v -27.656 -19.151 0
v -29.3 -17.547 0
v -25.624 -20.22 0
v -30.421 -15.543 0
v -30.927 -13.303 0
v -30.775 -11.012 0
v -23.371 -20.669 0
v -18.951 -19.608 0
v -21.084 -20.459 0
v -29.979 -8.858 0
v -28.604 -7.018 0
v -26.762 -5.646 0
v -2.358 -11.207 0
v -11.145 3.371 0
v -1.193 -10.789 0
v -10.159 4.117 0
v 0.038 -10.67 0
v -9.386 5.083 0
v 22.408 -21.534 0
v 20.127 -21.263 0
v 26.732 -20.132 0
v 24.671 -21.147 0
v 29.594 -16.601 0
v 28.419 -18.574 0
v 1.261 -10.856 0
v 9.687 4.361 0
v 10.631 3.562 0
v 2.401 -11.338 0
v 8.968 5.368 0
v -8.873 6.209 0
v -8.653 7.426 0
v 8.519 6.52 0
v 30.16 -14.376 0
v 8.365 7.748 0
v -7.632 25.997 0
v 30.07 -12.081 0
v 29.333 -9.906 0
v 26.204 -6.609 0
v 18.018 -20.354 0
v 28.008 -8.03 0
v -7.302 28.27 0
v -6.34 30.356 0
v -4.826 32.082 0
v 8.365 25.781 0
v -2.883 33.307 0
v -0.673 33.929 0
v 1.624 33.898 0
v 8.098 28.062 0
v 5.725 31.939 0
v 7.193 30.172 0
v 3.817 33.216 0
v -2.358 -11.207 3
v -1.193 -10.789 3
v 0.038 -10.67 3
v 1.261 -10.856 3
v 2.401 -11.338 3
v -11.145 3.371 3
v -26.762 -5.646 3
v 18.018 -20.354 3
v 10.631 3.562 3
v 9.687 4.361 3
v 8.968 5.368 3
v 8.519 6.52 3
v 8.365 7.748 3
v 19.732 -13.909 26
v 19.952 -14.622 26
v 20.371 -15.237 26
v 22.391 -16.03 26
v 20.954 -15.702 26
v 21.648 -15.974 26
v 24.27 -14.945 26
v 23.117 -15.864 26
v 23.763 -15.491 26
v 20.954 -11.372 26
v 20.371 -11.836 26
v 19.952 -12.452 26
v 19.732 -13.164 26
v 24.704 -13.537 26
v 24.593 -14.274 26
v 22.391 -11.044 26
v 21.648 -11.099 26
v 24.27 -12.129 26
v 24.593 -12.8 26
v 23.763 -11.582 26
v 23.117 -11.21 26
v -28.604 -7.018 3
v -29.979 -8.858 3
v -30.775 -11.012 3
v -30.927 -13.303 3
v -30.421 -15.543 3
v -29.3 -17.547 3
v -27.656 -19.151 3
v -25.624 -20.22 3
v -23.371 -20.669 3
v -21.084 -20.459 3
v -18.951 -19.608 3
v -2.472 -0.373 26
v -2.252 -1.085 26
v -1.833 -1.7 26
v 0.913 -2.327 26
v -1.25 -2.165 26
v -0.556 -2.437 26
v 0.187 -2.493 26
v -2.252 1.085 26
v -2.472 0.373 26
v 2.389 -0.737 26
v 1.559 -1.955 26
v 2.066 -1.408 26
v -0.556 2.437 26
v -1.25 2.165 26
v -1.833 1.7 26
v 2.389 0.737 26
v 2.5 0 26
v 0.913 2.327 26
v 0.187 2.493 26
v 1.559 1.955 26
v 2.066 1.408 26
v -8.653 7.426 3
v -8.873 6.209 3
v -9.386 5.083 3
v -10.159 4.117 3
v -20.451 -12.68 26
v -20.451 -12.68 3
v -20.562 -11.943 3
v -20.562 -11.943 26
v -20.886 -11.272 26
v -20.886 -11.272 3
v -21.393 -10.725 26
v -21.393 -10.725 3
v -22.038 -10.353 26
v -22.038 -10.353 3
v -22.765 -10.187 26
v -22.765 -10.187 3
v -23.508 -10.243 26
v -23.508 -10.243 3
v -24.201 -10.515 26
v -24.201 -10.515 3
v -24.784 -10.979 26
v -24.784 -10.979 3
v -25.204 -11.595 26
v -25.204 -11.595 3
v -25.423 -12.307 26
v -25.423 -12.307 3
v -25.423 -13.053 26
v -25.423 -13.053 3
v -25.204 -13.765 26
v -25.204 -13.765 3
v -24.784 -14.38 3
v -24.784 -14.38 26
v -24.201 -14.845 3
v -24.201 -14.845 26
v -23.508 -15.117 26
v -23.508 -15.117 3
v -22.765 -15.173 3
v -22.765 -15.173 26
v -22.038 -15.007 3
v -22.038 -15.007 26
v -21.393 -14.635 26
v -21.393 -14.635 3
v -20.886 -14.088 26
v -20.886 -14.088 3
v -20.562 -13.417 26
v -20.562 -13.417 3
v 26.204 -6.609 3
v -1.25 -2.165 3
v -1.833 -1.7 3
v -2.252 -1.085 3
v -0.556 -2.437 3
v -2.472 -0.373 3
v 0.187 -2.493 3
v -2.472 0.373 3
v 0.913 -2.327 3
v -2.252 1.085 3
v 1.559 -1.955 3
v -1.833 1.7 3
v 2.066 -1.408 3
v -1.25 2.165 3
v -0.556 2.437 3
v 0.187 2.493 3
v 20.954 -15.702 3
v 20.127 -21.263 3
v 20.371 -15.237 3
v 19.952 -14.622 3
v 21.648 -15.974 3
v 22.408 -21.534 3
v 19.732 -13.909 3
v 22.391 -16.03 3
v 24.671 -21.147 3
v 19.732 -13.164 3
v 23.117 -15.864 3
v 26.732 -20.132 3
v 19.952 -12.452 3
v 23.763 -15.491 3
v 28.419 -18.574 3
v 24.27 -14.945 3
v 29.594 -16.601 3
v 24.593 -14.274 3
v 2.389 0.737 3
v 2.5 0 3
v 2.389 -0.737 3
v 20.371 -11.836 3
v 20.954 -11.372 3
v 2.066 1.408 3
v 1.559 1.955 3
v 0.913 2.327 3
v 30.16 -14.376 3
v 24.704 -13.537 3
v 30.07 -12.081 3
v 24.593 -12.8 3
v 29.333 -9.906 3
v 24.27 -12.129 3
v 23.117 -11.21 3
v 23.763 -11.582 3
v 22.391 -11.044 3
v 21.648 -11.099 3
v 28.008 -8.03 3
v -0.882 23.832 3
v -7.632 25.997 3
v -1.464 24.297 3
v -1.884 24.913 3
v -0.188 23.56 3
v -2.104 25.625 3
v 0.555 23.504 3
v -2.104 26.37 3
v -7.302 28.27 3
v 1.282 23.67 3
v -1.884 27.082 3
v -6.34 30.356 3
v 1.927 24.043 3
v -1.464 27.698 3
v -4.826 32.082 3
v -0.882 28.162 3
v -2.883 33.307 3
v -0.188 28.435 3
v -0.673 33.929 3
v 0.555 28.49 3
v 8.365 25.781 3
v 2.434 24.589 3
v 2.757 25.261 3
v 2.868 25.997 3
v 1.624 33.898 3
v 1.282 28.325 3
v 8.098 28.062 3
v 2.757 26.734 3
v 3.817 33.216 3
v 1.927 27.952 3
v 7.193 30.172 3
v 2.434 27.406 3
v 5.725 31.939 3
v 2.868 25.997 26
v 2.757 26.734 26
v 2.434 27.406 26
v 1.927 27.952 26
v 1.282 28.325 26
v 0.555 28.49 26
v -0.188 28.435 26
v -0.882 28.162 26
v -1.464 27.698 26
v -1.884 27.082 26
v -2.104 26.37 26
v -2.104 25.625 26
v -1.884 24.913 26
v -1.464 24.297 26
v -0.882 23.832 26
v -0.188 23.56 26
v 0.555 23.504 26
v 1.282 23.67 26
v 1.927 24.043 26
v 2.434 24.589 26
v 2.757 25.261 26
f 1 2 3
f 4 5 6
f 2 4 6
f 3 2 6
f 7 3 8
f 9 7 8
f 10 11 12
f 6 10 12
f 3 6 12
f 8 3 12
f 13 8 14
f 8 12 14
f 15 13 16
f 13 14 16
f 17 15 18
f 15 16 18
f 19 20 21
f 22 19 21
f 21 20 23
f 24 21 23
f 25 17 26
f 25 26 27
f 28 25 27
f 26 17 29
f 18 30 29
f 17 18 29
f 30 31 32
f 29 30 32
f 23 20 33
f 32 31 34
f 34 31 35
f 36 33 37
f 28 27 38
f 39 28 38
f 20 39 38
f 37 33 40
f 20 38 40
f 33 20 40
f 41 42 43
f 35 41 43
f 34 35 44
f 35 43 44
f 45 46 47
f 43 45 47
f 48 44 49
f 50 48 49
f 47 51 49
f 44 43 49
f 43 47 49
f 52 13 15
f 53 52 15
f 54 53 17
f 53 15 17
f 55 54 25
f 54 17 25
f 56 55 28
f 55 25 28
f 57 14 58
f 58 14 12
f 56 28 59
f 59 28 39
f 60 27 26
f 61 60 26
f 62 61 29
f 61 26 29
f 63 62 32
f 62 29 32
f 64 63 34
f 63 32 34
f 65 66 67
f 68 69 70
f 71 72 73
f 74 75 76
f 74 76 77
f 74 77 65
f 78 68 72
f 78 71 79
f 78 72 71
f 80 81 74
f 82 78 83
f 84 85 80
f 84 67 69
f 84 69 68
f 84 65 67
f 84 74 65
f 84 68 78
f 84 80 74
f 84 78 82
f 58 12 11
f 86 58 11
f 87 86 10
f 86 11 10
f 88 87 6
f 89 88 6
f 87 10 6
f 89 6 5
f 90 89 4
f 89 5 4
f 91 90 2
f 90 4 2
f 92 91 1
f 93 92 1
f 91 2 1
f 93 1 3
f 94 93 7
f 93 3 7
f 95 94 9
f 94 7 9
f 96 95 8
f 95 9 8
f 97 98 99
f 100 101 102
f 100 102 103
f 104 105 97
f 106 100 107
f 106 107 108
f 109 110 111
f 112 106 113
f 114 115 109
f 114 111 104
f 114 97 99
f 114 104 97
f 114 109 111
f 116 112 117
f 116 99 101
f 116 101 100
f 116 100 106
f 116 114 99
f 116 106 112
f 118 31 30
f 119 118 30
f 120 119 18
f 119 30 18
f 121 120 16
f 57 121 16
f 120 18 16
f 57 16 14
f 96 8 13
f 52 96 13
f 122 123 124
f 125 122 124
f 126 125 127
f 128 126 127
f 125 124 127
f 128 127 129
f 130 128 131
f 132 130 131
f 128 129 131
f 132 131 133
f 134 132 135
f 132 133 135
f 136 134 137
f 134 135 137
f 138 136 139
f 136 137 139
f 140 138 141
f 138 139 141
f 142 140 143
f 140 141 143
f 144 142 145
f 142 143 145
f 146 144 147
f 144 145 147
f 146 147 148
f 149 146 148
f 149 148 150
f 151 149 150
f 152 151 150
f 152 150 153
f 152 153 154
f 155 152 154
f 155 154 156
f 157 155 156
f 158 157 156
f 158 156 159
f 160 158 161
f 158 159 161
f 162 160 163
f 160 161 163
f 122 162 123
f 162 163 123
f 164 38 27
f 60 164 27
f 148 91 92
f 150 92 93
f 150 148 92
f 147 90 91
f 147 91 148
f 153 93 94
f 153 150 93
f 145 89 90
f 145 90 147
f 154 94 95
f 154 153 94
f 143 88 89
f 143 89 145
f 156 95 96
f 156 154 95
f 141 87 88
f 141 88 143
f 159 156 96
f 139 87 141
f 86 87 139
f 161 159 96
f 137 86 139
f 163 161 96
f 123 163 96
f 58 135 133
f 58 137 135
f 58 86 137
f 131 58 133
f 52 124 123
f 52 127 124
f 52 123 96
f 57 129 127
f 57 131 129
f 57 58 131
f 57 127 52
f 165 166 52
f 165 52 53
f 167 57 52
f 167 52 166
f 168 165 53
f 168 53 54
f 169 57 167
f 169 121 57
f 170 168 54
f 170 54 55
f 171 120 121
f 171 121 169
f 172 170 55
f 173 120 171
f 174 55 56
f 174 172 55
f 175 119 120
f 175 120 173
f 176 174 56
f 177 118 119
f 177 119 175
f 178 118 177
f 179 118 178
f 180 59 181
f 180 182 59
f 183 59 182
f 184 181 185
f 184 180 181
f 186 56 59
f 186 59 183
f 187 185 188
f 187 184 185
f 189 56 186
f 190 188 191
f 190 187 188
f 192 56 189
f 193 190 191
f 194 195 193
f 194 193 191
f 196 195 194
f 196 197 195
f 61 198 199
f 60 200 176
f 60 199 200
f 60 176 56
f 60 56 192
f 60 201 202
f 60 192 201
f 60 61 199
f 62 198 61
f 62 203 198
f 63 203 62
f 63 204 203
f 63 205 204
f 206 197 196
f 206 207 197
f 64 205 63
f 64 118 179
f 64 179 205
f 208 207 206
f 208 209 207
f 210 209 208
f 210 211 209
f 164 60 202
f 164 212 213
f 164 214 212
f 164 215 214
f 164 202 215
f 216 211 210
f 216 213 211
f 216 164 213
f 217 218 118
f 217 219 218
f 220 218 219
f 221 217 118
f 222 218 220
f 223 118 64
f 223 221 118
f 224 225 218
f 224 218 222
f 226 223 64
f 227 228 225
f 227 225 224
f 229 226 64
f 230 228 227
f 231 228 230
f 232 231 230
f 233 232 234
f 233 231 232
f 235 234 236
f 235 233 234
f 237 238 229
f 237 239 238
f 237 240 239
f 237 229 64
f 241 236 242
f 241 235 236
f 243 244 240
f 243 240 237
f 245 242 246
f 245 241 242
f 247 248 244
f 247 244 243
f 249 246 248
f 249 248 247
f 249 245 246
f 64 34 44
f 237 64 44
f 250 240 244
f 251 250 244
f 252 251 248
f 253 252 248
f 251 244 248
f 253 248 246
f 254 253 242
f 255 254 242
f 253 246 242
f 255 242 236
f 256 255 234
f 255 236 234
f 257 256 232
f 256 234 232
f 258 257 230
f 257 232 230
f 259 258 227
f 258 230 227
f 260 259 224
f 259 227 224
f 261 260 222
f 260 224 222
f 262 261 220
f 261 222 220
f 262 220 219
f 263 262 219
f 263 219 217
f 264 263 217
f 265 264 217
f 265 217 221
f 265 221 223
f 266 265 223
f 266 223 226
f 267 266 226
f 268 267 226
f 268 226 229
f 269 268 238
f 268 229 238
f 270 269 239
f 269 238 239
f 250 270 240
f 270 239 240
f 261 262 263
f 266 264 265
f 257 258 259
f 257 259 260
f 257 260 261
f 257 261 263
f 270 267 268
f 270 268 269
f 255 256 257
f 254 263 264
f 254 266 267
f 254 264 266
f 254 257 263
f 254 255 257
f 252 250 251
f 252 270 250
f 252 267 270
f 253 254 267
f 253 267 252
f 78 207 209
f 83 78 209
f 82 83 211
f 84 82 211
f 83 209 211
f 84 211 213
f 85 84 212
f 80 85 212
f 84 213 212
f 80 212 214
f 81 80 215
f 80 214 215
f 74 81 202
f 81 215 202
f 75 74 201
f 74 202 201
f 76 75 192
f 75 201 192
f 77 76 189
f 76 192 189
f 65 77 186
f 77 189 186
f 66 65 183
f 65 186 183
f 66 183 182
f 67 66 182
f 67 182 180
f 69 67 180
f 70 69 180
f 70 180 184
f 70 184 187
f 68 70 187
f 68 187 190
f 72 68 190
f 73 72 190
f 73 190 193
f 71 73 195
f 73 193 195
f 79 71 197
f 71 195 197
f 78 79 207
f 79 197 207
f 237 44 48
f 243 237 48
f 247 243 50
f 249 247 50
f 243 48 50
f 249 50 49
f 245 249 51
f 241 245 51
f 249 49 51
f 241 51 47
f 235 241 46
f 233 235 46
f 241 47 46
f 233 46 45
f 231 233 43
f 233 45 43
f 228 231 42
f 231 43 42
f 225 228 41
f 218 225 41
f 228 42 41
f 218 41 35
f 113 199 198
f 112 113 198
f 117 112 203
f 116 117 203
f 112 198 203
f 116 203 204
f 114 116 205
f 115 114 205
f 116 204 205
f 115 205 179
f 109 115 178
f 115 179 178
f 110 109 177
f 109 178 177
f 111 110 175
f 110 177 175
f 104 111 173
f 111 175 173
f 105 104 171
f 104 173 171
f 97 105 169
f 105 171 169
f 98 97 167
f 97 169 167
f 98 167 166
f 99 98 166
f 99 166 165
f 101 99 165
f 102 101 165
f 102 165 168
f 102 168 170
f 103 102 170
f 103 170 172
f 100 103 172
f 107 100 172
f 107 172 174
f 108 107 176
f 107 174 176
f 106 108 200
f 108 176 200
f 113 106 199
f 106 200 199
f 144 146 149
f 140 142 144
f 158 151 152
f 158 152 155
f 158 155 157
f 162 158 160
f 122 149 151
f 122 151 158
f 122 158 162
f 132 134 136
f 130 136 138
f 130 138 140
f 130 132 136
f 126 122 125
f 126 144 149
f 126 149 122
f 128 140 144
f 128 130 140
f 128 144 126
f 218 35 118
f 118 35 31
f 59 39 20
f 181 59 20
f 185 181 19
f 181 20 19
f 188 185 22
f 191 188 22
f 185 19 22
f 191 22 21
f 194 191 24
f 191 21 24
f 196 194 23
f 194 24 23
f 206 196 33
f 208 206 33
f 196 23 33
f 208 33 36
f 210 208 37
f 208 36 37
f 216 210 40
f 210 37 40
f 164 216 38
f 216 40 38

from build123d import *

# Parameters (mm, degrees)
F1_DEPTH = 3
F2_R     = 2.5
F3_DEPTH = 23


with BuildPart() as f1:
    # F0 (on Top) → F1 (new body)
    with BuildSketch(Plane.XY):
        with BuildLine():
            Line((8.3654914829, 7.7478343503), (8.3654914829, 25.7808157751))
            ThreePointArc((8.3654914829, 25.7808157751), (0.4767203504, 33.9966565171), (-7.631576467, 25.9973895632))
            Line((-7.631576467, 25.9973895632), (-8.6528857034, 7.4260866897))
            ThreePointArc((-8.6528857034, 7.4260866897), (-9.3855131516, 5.0826540918), (-11.1453419747, 3.3705145438))
            Line((-11.1453419747, 3.3705145438), (-26.7623619946, -5.6459761686))
            ThreePointArc((-26.7623619946, -5.6459761686), (-29.9331032244, -16.585772745), (-18.951386422, -19.6081302933))
            Line((-18.951386422, -19.6081302933), (-2.3575117339, -11.2069586004))
            ThreePointArc((-2.3575117339, -11.2069586004), (0.038274152, -10.6697162831), (2.400944907, -11.3377029763))
            Line((2.400944907, -11.3377029763), (18.0179649268, -20.3541936886))
            ThreePointArc((18.0179649268, -20.3541936886), (29.0774772891, -17.6302378543), (26.2040573041, -6.6086133521))
            Line((26.2040573041, -6.6086133521), (10.6314918524, 3.5615178285))
            ThreePointArc((10.6314918524, 3.5615178285), (8.9683334147, 5.3677081091), (8.3654914829, 7.7478343503))
        make_face()
        with BuildLine():
            ThreePointArc((-20.451386422, -12.679927063), (-25.3707248656, -13.3098488797), (-20.7688276181, -11.4607318089))
            ThreePointArc((-20.7688276181, -11.4607318089), (-20.5320479783, -12.0500052463), (-20.451386422, -12.679927063))
        make_face(mode=Mode.SUBTRACT)
        with BuildLine():
            ThreePointArc((24.7040573041, -13.5368165824), (21.5399163779, -15.9469860432), (20.0569238399, -12.25626284))
            ThreePointArc((20.0569238399, -12.25626284), (22.8681982302, -11.1266471215), (24.7040573041, -13.5368165824))
        make_face(mode=Mode.SUBTRACT)
        with BuildLine():
            ThreePointArc((-7.9164689421, -4.2812988086), (-7.6979940139, 4.6627125327), (0.127531223, 8.9990963873))
            ThreePointArc((0.127531223, 8.9990963873), (6.4088915191, 6.3187110629), (9, 0))
            ThreePointArc((9, 0), (8.6421794957, -2.5125153857), (7.5971703192, -4.8252464332))
            ThreePointArc((7.5971703192, -4.8252464332), (-0.315369081, -8.9944728774), (-7.9164689421, -4.2812988086))
        make_face(mode=Mode.SUBTRACT)
        with BuildLine():
            ThreePointArc((2.868423533, 25.9973895632), (2.1236210505, 24.217141919), (0.3329981933, 23.4976405667))
            ThreePointArc((0.3329981933, 23.4976405667), (-1.3867739845, 27.7776372074), (2.868423533, 25.9973895632))
        make_face(mode=Mode.SUBTRACT)
        with BuildLine():
            Line((7.5971703192, -4.8252464332), (2.0066709741, -1.4910639161))
            ThreePointArc((2.0066709741, -1.4910639161), (-0.2232494881, -2.4900119811), (-2.239906233, -1.1103243073))
            Line((-2.239906233, -1.1103243073), (-7.9164689421, -4.2812988086))
            ThreePointArc((-7.9164689421, -4.2812988086), (-0.315369081, -8.9944728774), (7.5971703192, -4.8252464332))
        make_face()
        with BuildLine():
            ThreePointArc((-2.239906233, -1.1103243073), (-2.1149683962, 1.333007383), (0.0354253397, 2.4997489965))
            Line((0.0354253397, 2.4997489965), (0.127531223, 8.9990963873))
            ThreePointArc((0.127531223, 8.9990963873), (-7.6979940139, 4.6627125327), (-7.9164689421, -4.2812988086))
            Line((-7.9164689421, -4.2812988086), (-2.239906233, -1.1103243073))
        make_face()
        with BuildLine():
            ThreePointArc((0.0354253397, 2.4997489965), (1.7802476442, 1.7551975175), (2.5, 0))
            ThreePointArc((2.5, 0), (2.3734655501, -0.7852778377), (2.0066709741, -1.4910639161))
            Line((2.0066709741, -1.4910639161), (7.5971703192, -4.8252464332))
            ThreePointArc((7.5971703192, -4.8252464332), (8.6421794957, -2.5125153857), (9, 0))
            ThreePointArc((9, 0), (6.4088915191, 6.3187110629), (0.127531223, 8.9990963873))
            Line((0.127531223, 8.9990963873), (0.0354253397, 2.4997489965))
        make_face()
        with BuildLine():
            ThreePointArc((2.868423533, 25.9973895632), (-1.3867739845, 27.7776372074), (0.3329981933, 23.4976405667))
            ThreePointArc((0.3329981933, 23.4976405667), (2.1236210505, 24.217141919), (2.868423533, 25.9973895632))
        make_face()
        with BuildLine():
            ThreePointArc((24.7040573041, -13.5368165824), (22.8681982302, -11.1266471215), (20.0569238399, -12.25626284))
            ThreePointArc((20.0569238399, -12.25626284), (21.5399163779, -15.9469860432), (24.7040573041, -13.5368165824))
        make_face()
        with BuildLine():
            ThreePointArc((2.0066709741, -1.4910639161), (2.3734655501, -0.7852778377), (2.5, 0))
            ThreePointArc((2.5, 0), (1.7802476442, 1.7551975175), (0.0354253397, 2.4997489965))
            ThreePointArc((0.0354253397, 2.4997489965), (-2.1149683962, 1.333007383), (-2.239906233, -1.1103243073))
            ThreePointArc((-2.239906233, -1.1103243073), (-0.2232494881, -2.4900119811), (2.0066709741, -1.4910639161))
        make_face()
        with BuildLine():
            ThreePointArc((-20.451386422, -12.679927063), (-20.5320479783, -12.0500052463), (-20.7688276181, -11.4607318089))
            ThreePointArc((-20.7688276181, -11.4607318089), (-25.3707248656, -13.3098488797), (-20.451386422, -12.679927063))
        make_face()
    extrude(amount=F1_DEPTH)

    # F2 (on face) → F3 (join)
    with BuildSketch(Plane.XY.offset(3)):
        with Locations((-22.951386422, -12.679927063)):
            Circle(F2_R)
        with Locations((0.368423533, 25.9973895632)):
            Circle(F2_R)
        with Locations((22.2040573041, -13.5368165824)):
            Circle(F2_R)
        Circle(F2_R)
    extrude(amount=F3_DEPTH)


solid = f1.part
